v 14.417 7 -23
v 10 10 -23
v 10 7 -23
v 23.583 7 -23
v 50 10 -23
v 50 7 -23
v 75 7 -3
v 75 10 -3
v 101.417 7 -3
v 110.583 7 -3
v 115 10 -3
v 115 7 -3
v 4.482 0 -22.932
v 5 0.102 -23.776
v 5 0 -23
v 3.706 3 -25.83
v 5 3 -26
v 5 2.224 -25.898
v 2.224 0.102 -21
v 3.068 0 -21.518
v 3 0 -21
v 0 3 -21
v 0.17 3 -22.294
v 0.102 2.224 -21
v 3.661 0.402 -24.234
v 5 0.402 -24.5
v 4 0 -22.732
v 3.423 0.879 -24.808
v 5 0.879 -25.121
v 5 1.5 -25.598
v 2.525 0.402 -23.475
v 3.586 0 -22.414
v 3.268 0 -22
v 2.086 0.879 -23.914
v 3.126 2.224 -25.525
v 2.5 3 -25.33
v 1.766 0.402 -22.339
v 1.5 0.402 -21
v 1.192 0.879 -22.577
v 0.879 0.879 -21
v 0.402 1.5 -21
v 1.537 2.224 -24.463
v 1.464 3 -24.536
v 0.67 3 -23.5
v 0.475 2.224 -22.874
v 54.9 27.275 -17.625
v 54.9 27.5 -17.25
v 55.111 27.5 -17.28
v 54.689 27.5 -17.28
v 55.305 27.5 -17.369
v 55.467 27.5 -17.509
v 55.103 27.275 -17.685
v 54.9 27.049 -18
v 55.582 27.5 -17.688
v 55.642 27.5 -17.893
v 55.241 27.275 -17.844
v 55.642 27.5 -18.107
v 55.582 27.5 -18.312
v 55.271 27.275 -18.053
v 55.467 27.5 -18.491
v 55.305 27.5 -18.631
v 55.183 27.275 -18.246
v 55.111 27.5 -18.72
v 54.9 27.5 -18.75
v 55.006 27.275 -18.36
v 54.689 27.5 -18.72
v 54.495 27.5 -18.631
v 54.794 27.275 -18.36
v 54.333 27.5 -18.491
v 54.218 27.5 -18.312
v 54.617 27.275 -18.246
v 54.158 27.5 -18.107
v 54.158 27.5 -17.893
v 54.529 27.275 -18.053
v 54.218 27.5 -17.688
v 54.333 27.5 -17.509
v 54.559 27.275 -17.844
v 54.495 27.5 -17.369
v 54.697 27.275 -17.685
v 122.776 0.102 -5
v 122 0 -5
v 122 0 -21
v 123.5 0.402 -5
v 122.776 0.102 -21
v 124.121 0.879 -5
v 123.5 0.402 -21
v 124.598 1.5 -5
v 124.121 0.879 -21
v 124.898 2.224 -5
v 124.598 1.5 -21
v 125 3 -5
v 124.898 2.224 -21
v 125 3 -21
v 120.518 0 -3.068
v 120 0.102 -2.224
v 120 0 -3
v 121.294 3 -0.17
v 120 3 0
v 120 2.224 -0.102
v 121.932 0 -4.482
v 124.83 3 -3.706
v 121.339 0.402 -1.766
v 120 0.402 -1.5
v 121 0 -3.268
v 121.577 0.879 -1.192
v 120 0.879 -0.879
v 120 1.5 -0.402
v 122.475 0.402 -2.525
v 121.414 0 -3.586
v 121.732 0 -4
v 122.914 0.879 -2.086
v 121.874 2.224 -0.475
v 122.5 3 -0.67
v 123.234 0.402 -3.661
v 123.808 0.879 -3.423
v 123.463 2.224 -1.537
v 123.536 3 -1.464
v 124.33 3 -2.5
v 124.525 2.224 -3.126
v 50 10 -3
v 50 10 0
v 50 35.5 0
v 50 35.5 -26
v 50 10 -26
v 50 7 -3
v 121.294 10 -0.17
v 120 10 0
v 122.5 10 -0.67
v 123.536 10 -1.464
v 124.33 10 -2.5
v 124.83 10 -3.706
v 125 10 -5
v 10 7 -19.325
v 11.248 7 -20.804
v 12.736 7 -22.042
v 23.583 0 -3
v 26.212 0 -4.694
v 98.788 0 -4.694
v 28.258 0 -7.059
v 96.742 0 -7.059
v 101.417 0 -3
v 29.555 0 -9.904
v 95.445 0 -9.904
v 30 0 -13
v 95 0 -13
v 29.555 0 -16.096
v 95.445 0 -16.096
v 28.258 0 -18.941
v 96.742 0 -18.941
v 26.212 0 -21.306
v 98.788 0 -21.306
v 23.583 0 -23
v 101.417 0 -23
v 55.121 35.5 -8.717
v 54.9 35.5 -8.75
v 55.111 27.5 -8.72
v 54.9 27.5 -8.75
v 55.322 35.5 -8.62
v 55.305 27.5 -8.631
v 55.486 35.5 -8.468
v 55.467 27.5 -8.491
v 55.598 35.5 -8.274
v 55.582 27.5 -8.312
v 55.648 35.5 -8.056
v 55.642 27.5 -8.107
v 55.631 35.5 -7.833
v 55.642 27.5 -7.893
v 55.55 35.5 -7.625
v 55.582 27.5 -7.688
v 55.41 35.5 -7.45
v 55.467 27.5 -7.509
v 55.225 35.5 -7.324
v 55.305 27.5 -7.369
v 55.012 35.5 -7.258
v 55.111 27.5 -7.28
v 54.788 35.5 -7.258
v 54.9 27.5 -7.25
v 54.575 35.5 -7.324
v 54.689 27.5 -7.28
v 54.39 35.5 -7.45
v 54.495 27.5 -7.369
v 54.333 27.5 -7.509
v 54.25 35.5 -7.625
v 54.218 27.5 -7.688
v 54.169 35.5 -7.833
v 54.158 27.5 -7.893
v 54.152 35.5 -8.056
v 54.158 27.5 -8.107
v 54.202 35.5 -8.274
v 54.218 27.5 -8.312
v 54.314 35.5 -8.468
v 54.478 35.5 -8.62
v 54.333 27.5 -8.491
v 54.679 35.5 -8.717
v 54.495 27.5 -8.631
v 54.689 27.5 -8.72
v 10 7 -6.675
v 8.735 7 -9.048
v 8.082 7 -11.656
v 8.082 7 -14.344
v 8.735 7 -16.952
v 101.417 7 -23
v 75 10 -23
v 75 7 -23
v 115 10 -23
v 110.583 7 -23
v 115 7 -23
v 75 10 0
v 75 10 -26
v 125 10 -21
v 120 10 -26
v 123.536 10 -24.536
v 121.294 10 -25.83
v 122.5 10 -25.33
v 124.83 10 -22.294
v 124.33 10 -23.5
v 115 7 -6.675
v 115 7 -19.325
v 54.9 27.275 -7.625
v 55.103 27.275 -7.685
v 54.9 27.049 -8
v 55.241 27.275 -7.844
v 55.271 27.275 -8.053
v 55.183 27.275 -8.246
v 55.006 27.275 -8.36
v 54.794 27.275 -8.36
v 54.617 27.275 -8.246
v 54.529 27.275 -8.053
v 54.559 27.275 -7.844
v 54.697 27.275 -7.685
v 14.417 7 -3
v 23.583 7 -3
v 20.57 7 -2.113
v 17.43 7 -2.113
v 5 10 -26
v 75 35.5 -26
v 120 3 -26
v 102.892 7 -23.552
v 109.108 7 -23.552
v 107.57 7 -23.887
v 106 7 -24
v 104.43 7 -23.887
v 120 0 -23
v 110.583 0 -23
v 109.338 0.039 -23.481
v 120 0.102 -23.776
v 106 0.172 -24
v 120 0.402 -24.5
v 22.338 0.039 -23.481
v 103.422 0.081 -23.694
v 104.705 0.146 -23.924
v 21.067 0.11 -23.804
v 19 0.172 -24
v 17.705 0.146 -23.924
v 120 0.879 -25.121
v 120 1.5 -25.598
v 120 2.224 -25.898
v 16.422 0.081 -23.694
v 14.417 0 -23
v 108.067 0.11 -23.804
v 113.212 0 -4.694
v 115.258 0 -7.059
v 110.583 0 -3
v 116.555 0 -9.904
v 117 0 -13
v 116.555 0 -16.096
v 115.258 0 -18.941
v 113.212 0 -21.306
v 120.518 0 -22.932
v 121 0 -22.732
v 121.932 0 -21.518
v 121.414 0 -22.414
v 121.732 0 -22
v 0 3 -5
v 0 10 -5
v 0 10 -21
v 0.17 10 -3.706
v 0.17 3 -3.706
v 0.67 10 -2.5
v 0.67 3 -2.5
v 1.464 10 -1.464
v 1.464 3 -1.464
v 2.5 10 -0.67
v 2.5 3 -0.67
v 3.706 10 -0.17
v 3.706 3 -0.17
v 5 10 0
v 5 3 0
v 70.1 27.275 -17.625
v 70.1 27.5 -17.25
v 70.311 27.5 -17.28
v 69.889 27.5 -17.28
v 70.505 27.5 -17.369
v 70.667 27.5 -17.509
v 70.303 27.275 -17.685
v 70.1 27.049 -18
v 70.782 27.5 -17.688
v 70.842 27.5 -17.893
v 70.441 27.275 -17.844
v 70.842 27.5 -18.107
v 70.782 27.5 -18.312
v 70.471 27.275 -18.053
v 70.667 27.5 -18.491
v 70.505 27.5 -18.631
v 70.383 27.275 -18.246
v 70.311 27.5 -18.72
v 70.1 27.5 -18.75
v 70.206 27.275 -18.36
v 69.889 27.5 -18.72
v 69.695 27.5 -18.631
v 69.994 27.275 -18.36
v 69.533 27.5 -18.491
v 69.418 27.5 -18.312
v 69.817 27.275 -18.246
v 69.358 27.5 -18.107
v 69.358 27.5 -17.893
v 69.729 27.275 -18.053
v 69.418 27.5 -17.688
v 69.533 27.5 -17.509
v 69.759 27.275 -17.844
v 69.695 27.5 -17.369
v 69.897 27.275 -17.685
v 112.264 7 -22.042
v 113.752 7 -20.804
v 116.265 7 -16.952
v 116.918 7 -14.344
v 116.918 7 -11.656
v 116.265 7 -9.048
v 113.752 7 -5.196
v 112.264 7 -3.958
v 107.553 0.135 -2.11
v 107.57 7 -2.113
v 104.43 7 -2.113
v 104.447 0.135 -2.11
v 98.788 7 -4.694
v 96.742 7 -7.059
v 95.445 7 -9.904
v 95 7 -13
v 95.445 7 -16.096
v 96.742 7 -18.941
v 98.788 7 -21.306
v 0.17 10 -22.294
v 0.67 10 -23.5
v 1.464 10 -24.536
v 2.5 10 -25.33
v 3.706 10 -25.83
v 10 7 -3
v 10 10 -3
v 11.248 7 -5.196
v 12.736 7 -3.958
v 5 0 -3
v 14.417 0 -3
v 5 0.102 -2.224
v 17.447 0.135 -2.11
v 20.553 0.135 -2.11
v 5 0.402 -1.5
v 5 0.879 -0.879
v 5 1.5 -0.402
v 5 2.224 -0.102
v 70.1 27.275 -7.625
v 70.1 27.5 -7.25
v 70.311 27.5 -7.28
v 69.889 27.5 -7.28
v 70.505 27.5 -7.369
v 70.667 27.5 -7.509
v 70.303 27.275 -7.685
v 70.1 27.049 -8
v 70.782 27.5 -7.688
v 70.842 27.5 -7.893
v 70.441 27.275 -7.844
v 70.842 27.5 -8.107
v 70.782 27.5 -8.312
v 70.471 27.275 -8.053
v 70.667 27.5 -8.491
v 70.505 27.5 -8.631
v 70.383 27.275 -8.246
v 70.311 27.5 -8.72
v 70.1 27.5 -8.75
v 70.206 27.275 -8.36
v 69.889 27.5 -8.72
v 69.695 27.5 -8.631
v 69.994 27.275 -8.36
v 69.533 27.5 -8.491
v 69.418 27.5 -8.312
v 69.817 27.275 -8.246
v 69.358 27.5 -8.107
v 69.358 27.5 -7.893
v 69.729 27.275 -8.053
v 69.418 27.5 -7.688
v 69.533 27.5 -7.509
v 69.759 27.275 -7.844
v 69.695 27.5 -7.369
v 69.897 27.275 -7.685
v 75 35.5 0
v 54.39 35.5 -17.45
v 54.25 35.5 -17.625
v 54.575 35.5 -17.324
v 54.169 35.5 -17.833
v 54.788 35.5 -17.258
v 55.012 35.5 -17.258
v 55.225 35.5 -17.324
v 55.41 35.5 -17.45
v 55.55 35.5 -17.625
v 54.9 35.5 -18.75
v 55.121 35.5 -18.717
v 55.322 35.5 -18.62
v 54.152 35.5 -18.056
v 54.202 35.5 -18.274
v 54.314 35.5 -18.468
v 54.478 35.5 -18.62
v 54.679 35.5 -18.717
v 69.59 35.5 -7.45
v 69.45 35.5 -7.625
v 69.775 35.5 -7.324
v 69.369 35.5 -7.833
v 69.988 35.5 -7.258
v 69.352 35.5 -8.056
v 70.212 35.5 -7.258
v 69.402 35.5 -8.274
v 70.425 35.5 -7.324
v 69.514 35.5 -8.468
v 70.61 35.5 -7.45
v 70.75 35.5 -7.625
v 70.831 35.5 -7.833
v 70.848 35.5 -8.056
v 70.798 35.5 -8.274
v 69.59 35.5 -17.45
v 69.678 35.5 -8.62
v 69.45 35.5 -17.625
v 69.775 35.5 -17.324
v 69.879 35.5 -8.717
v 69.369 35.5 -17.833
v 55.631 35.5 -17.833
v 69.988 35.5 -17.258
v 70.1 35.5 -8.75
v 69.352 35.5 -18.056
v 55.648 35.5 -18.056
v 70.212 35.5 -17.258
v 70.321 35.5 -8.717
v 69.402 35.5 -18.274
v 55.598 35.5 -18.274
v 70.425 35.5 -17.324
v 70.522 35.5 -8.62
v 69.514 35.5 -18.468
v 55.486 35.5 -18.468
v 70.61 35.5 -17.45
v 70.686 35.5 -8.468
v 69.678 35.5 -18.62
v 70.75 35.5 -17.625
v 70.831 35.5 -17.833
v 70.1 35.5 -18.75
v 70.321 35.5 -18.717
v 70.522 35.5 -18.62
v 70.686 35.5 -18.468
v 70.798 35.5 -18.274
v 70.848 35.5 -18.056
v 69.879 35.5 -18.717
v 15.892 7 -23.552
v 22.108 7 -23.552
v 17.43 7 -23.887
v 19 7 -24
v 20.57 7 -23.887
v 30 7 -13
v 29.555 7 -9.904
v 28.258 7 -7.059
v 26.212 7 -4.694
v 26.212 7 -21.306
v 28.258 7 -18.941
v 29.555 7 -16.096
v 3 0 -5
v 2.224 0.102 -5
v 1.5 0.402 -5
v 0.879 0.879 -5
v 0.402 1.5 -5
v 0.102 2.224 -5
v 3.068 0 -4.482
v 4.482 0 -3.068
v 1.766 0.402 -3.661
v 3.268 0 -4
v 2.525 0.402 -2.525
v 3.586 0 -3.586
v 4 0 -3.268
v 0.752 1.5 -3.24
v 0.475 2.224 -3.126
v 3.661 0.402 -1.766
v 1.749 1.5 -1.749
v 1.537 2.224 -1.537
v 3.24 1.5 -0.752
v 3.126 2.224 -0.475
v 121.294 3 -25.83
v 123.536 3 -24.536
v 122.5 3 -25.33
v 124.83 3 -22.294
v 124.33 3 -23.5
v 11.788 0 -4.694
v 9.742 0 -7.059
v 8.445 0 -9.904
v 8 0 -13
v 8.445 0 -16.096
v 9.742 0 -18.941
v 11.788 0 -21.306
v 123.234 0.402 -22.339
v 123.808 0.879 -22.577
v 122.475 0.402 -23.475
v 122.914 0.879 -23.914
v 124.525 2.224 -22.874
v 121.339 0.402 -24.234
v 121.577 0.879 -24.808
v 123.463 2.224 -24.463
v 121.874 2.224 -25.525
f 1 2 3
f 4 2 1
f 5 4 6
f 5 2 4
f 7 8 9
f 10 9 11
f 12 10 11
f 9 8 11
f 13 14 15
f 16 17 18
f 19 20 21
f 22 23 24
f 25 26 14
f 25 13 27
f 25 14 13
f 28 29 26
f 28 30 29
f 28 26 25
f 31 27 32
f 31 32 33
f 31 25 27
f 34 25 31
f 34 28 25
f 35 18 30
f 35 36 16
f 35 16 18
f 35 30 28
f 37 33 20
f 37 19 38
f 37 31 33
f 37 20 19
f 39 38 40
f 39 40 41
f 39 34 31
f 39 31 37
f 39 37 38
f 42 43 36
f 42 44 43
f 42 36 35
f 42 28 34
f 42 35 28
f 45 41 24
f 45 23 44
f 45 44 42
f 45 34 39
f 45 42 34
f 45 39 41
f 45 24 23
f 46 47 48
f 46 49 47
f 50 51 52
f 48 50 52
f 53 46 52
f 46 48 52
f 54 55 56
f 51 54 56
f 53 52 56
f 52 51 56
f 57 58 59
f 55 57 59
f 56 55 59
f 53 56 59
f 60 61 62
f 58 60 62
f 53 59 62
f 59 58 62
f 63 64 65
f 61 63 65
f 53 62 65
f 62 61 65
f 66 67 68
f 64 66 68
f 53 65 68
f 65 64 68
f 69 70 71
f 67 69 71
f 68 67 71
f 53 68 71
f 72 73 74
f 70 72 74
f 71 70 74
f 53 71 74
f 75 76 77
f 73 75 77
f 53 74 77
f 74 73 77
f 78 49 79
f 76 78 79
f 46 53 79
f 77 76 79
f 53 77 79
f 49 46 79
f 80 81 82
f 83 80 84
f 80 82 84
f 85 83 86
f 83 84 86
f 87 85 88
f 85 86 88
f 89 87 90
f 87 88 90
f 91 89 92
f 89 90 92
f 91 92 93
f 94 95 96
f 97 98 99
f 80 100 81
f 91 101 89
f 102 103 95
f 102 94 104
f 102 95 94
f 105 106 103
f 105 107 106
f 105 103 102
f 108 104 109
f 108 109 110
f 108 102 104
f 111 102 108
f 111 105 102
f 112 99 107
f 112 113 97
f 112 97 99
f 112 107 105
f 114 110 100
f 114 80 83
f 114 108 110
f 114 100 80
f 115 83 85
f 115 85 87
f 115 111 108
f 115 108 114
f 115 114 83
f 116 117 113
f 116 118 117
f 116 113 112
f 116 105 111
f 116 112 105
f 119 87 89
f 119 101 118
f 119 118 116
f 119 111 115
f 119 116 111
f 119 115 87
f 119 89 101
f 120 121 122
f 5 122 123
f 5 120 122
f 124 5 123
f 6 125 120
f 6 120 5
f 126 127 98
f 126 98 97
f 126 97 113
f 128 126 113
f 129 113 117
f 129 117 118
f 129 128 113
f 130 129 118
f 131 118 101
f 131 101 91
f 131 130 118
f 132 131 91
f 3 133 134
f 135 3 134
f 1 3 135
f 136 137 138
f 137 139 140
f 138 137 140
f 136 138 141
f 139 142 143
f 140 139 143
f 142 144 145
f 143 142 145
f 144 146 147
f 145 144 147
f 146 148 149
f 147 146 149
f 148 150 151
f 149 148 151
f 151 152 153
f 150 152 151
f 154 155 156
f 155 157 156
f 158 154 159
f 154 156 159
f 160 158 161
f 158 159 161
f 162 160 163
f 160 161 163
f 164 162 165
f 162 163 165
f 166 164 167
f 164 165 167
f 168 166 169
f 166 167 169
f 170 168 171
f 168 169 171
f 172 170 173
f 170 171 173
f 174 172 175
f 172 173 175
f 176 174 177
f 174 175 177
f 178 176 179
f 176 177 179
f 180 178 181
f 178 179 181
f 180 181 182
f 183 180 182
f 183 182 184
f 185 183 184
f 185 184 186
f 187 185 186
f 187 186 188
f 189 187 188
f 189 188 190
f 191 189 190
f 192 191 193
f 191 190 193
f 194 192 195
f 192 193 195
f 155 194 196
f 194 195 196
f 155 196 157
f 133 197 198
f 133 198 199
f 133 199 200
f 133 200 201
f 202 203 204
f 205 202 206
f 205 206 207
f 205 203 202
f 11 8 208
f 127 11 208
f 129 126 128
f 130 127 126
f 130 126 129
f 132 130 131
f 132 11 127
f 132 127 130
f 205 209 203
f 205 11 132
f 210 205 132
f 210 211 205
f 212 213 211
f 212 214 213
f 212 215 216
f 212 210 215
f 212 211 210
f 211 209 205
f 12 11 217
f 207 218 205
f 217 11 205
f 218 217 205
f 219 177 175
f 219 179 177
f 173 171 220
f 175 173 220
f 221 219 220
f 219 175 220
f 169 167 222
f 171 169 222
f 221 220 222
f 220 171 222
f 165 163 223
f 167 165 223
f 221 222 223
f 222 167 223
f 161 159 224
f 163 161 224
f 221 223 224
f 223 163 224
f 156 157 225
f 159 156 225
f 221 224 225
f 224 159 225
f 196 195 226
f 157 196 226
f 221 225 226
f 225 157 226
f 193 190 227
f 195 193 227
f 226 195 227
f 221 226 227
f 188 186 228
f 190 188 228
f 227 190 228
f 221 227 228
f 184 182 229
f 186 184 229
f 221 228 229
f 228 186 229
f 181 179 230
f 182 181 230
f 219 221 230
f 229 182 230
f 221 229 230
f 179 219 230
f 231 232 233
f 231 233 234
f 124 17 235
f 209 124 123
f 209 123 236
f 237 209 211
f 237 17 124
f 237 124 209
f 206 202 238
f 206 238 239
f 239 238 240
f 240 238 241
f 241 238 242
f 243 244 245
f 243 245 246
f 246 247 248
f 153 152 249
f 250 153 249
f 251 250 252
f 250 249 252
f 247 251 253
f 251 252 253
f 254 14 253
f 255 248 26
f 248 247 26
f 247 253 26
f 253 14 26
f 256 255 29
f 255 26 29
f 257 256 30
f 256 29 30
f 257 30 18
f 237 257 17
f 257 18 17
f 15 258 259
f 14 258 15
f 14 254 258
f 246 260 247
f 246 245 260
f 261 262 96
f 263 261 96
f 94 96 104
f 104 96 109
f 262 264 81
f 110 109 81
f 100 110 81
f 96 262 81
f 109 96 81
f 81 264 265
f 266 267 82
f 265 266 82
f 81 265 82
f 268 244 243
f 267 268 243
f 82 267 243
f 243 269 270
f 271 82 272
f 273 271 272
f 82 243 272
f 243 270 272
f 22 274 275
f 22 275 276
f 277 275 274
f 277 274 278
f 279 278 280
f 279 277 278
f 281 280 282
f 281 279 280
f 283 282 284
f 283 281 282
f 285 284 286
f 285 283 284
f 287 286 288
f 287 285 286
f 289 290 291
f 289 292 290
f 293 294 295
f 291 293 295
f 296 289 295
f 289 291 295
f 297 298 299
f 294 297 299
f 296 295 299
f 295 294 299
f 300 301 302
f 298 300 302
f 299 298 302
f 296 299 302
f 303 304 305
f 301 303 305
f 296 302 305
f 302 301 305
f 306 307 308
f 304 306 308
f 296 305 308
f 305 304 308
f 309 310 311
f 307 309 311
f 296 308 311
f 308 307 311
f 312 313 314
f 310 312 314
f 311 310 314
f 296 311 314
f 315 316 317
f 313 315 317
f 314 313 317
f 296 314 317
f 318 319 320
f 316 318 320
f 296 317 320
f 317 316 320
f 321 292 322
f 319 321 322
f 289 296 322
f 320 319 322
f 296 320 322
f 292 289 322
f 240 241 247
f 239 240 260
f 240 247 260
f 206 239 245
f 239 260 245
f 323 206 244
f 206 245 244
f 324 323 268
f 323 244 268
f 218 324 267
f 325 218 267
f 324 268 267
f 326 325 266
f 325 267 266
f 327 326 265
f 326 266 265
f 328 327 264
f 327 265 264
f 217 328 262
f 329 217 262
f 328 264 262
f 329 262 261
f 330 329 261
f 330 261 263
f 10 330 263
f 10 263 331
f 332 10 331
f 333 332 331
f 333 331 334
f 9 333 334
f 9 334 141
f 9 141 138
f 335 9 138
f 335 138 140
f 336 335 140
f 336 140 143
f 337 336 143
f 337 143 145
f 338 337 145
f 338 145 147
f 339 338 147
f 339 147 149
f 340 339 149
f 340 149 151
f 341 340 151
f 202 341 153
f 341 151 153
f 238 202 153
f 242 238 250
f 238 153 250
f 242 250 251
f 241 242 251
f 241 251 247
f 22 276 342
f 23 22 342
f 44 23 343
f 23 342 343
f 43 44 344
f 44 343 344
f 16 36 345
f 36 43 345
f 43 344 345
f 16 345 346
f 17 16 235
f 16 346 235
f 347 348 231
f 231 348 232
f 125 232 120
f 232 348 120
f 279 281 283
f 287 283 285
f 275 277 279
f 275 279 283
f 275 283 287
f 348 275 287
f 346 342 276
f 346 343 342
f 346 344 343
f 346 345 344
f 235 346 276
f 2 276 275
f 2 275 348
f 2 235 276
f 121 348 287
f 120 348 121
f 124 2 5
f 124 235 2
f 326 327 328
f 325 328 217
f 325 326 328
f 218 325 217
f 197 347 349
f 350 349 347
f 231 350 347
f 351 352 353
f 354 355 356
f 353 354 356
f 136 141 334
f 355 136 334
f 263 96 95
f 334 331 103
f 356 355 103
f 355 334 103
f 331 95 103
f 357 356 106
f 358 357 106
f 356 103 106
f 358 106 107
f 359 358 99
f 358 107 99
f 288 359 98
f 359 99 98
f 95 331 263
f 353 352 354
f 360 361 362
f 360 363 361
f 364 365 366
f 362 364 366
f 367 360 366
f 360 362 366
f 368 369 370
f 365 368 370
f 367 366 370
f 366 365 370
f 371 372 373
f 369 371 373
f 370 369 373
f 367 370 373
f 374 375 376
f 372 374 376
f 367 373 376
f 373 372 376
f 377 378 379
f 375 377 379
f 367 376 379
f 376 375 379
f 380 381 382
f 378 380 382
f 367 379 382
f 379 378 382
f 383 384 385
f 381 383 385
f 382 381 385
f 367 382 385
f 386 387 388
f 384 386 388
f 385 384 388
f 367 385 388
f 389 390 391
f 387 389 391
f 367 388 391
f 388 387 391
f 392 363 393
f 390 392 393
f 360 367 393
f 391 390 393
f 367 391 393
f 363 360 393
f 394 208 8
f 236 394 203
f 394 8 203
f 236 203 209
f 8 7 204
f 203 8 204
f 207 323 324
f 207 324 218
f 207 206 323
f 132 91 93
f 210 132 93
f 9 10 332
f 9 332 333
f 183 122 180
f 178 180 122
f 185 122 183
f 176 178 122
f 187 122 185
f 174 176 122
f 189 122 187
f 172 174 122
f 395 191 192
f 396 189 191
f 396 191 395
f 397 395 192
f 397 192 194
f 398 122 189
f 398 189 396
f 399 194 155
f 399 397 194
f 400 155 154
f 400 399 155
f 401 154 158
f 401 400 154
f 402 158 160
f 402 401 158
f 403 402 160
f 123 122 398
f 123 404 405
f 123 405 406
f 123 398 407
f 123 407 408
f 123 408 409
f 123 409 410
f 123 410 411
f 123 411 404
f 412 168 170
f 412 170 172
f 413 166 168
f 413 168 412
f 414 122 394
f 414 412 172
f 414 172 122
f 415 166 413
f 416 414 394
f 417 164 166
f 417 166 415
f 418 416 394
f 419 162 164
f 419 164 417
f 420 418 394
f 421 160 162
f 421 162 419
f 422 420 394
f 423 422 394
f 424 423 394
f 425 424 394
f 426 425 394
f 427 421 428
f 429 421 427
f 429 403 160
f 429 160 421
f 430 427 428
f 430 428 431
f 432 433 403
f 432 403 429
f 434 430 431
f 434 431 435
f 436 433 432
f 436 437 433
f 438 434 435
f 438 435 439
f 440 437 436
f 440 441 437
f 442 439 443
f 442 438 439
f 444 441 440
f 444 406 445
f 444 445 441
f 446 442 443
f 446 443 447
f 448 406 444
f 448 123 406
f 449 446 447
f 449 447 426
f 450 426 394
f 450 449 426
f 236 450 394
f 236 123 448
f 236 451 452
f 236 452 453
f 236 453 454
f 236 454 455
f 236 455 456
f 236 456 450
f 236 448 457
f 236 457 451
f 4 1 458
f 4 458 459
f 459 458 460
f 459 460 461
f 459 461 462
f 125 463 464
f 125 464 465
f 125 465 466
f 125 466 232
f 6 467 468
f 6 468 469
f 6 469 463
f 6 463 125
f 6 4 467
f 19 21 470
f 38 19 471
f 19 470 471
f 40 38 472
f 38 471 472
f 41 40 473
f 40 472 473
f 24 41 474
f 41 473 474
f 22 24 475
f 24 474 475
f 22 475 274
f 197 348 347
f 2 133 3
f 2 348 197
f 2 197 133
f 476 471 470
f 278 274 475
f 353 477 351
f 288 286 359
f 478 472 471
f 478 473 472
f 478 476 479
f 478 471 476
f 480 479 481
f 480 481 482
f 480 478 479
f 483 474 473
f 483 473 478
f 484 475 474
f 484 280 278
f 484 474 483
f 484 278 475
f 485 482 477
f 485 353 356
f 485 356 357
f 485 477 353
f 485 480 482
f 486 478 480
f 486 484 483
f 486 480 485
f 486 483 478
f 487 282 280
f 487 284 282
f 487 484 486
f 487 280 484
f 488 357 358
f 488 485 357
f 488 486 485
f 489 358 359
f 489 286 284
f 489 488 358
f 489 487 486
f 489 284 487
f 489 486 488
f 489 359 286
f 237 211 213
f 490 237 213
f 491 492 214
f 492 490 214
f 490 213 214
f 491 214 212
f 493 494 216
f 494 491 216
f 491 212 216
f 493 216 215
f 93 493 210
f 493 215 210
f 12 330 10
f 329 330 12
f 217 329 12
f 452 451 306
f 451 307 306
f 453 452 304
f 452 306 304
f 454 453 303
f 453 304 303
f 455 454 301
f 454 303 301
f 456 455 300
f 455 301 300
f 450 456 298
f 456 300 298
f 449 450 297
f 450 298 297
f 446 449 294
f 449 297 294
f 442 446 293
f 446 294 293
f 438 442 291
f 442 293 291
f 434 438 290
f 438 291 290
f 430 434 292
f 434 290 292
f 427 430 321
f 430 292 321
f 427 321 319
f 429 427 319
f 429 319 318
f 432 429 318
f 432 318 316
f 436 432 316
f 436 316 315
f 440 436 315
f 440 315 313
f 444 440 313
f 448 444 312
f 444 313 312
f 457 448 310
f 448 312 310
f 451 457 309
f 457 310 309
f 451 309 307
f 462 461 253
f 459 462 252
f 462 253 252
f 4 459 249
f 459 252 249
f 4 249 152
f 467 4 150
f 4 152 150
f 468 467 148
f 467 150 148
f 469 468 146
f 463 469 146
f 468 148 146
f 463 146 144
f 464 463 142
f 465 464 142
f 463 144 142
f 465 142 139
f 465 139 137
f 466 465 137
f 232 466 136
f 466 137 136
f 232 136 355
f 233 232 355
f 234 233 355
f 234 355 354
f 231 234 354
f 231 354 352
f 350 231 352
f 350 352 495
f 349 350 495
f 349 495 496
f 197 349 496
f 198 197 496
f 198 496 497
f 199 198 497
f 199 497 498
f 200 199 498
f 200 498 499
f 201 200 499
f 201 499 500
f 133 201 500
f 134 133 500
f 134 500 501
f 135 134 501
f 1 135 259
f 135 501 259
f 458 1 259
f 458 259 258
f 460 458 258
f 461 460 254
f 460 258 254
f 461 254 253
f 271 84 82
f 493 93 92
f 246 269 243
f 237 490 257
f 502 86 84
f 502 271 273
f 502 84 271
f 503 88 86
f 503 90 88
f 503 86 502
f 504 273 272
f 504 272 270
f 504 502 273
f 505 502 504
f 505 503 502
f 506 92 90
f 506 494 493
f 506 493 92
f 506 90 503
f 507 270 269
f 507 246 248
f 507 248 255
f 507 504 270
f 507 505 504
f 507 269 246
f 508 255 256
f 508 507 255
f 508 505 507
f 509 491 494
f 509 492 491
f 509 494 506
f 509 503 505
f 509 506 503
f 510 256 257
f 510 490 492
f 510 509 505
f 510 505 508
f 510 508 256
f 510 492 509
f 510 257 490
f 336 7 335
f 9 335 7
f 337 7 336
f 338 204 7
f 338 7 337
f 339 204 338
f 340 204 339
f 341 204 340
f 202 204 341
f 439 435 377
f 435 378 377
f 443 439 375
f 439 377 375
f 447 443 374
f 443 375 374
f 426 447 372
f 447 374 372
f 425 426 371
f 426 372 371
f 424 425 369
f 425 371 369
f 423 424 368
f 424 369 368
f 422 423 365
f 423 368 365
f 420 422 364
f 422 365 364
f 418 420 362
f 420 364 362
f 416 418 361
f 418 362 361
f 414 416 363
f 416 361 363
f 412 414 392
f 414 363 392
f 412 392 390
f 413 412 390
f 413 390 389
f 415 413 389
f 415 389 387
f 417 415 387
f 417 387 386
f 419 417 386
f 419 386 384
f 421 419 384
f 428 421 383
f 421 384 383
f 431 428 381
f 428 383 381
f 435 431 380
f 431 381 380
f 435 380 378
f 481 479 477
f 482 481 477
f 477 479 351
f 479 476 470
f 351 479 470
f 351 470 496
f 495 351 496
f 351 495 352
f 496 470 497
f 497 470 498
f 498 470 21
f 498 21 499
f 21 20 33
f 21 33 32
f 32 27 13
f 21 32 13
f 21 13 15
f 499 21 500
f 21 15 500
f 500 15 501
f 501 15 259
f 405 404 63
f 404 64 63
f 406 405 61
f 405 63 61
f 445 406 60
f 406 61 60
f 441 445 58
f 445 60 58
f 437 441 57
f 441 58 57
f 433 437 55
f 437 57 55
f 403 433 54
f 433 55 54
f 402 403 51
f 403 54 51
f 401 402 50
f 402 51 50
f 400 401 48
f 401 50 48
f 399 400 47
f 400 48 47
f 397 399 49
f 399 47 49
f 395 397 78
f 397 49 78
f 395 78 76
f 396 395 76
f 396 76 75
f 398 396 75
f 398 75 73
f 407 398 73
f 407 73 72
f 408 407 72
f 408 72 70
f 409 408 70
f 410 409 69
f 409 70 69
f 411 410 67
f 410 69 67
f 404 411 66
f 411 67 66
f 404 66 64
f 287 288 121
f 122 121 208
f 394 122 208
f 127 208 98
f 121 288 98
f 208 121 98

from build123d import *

# Parameters (mm, degrees)
SKETCH1_W                 = 125
SKETCH1_H                 = 26
BOSS_EXTRUDE1_DEPTH       = 10
SKETCH2_W                 = 25
SKETCH2_H                 = 26
BOSS_EXTRUDE2_DEPTH       = 27.5
FILLET3_R                 = 5
FILLET4_R                 = 3
SKETCH3_W                 = 40
SKETCH3_H                 = 20
CUT_EXTRUDE2_DEPTH        = 2
SKETCH5_W                 = 40
SKETCH5_H                 = 20
CUT_EXTRUDE3_DEPTH        = 2
SKETCH6_R                 = 11
CUT_EXTRUDE5_DEPTH        = 7
SKETCH7_R                 = 11
CUT_EXTRUDE6_DEPTH        = 7
SKETCH8_W                 = 25
SKETCH8_H                 = 26
CUT_EXTRUDE7_DEPTH        = 2
SKETCH9_W                 = 40
SKETCH9_H                 = 20
CUT_EXTRUDE8_DEPTH        = 1
F_1_5MM_DOWEL_HOLE1_D     = 1.5
F_1_5MM_DOWEL_HOLE1_DEPTH = 8
F_1_5MM_DOWEL_HOLE1_TIP   = 0.450645464


with BuildPart() as part:
    # Sketch1 → Boss-Extrude1 (new body)
    with BuildSketch(Plane(origin=(0, 0, 0), x_dir=(1, 0, 0), z_dir=(0, 1, 0))):
        with Locations((62.5, 13)):
            Rectangle(SKETCH1_W, SKETCH1_H)
    extrude(amount=BOSS_EXTRUDE1_DEPTH)

    # Sketch2 → Boss-Extrude2 (add)
    with BuildSketch(Plane(origin=(0, 10, 0), x_dir=(1, 0, 0), z_dir=(0, 1, 0))):
        with Locations((62.5, 13)):
            Rectangle(SKETCH2_W, SKETCH2_H)
    extrude(amount=BOSS_EXTRUDE2_DEPTH)

    # Fillet3
    fillet3_edges = [part.edges().sort_by_distance(p)[0] for p in [
        (0, 5, -26),
        (125, 5, -26),
        (125, 5, 0),
        (0, 5, 0),
    ]]
    fillet(fillet3_edges, radius=FILLET3_R)

    # Fillet4
    fillet4_edges = [part.edges().sort_by_distance(p)[0] for p in [
        (62.5, 0, 0),
        (0, 0, -13),
        (62.5, 0, -26),
        (125, 0, -13),
        (123.535533906, 0, -1.464466094),
        (123.535533906, 0, -24.535533906),
        (1.464466094, 0, -24.535533906),
        (1.464466094, 0, -1.464466094),
    ]]
    fillet(fillet4_edges, radius=FILLET4_R)

    # Sketch3 → Cut-Extrude2 (cut)
    with BuildSketch(Plane(origin=(0, 10, 0), x_dir=(1, 0, 0), z_dir=(0, 1, 0))):
        with Locations((30, 13)):
            Rectangle(SKETCH3_W, SKETCH3_H)
    extrude(amount=-CUT_EXTRUDE2_DEPTH, mode=Mode.SUBTRACT)

    # Sketch5 → Cut-Extrude3 (cut)
    with BuildSketch(Plane(origin=(0, 10, 0), x_dir=(1, 0, 0), z_dir=(0, 1, 0))):
        with Locations((95, 13)):
            Rectangle(SKETCH5_W, SKETCH5_H)
    extrude(amount=-CUT_EXTRUDE3_DEPTH, mode=Mode.SUBTRACT)

    # Sketch6 → Cut-Extrude5 (cut)
    with BuildSketch(Plane(origin=(0, 0, 0), x_dir=(-1, 0, 0), z_dir=(0, -1, 0))):
        with Locations(Location((-19, 13, 0), (0, 0, 90))):
            Circle(SKETCH6_R)
    extrude(amount=-CUT_EXTRUDE5_DEPTH, mode=Mode.SUBTRACT)

    # Sketch7 → Cut-Extrude6 (cut)
    with BuildSketch(Plane(origin=(0, 0, 0), x_dir=(-1, 0, 0), z_dir=(0, -1, 0))):
        with Locations(Location((-106, 13, 0), (0, 0, 90))):
            Circle(SKETCH7_R)
    extrude(amount=-CUT_EXTRUDE6_DEPTH, mode=Mode.SUBTRACT)

    # Sketch8 → Cut-Extrude7 (cut)
    with BuildSketch(Plane(origin=(0, 37.5, 0), x_dir=(1, 0, 0), z_dir=(0, 1, 0))):
        with Locations((62.5, 13)):
            Rectangle(SKETCH8_W, SKETCH8_H)
    extrude(amount=-CUT_EXTRUDE7_DEPTH, mode=Mode.SUBTRACT)

    # Sketch9 → Cut-Extrude8 (cut)
    with BuildSketch(Plane(origin=(0, 8, 0), x_dir=(1, 0, 0), z_dir=(0, 1, 0))):
        with Locations((30, 13)):
            Rectangle(SKETCH9_W, SKETCH9_H)
        with Locations((95, 13)):
            Rectangle(SKETCH9_W, SKETCH9_H)
    extrude(amount=-CUT_EXTRUDE8_DEPTH, mode=Mode.SUBTRACT)

    # Ø1.5mm Dowel Hole1
    with Locations(Plane(origin=(54.9, 35.5, -18), x_dir=(0, 0, 1), z_dir=(0, 1, 0))):
        with Locations((0, 0), (0, 15.2), (10, 15.2), (10, 0)):
            Hole(F_1_5MM_DOWEL_HOLE1_D / 2, depth=F_1_5MM_DOWEL_HOLE1_DEPTH)
            with Locations((0, 0, -(F_1_5MM_DOWEL_HOLE1_DEPTH + F_1_5MM_DOWEL_HOLE1_TIP / 2))):  # 118° drill point
                Cone(0, F_1_5MM_DOWEL_HOLE1_D / 2, F_1_5MM_DOWEL_HOLE1_TIP, mode=Mode.SUBTRACT)


solid = part.part
